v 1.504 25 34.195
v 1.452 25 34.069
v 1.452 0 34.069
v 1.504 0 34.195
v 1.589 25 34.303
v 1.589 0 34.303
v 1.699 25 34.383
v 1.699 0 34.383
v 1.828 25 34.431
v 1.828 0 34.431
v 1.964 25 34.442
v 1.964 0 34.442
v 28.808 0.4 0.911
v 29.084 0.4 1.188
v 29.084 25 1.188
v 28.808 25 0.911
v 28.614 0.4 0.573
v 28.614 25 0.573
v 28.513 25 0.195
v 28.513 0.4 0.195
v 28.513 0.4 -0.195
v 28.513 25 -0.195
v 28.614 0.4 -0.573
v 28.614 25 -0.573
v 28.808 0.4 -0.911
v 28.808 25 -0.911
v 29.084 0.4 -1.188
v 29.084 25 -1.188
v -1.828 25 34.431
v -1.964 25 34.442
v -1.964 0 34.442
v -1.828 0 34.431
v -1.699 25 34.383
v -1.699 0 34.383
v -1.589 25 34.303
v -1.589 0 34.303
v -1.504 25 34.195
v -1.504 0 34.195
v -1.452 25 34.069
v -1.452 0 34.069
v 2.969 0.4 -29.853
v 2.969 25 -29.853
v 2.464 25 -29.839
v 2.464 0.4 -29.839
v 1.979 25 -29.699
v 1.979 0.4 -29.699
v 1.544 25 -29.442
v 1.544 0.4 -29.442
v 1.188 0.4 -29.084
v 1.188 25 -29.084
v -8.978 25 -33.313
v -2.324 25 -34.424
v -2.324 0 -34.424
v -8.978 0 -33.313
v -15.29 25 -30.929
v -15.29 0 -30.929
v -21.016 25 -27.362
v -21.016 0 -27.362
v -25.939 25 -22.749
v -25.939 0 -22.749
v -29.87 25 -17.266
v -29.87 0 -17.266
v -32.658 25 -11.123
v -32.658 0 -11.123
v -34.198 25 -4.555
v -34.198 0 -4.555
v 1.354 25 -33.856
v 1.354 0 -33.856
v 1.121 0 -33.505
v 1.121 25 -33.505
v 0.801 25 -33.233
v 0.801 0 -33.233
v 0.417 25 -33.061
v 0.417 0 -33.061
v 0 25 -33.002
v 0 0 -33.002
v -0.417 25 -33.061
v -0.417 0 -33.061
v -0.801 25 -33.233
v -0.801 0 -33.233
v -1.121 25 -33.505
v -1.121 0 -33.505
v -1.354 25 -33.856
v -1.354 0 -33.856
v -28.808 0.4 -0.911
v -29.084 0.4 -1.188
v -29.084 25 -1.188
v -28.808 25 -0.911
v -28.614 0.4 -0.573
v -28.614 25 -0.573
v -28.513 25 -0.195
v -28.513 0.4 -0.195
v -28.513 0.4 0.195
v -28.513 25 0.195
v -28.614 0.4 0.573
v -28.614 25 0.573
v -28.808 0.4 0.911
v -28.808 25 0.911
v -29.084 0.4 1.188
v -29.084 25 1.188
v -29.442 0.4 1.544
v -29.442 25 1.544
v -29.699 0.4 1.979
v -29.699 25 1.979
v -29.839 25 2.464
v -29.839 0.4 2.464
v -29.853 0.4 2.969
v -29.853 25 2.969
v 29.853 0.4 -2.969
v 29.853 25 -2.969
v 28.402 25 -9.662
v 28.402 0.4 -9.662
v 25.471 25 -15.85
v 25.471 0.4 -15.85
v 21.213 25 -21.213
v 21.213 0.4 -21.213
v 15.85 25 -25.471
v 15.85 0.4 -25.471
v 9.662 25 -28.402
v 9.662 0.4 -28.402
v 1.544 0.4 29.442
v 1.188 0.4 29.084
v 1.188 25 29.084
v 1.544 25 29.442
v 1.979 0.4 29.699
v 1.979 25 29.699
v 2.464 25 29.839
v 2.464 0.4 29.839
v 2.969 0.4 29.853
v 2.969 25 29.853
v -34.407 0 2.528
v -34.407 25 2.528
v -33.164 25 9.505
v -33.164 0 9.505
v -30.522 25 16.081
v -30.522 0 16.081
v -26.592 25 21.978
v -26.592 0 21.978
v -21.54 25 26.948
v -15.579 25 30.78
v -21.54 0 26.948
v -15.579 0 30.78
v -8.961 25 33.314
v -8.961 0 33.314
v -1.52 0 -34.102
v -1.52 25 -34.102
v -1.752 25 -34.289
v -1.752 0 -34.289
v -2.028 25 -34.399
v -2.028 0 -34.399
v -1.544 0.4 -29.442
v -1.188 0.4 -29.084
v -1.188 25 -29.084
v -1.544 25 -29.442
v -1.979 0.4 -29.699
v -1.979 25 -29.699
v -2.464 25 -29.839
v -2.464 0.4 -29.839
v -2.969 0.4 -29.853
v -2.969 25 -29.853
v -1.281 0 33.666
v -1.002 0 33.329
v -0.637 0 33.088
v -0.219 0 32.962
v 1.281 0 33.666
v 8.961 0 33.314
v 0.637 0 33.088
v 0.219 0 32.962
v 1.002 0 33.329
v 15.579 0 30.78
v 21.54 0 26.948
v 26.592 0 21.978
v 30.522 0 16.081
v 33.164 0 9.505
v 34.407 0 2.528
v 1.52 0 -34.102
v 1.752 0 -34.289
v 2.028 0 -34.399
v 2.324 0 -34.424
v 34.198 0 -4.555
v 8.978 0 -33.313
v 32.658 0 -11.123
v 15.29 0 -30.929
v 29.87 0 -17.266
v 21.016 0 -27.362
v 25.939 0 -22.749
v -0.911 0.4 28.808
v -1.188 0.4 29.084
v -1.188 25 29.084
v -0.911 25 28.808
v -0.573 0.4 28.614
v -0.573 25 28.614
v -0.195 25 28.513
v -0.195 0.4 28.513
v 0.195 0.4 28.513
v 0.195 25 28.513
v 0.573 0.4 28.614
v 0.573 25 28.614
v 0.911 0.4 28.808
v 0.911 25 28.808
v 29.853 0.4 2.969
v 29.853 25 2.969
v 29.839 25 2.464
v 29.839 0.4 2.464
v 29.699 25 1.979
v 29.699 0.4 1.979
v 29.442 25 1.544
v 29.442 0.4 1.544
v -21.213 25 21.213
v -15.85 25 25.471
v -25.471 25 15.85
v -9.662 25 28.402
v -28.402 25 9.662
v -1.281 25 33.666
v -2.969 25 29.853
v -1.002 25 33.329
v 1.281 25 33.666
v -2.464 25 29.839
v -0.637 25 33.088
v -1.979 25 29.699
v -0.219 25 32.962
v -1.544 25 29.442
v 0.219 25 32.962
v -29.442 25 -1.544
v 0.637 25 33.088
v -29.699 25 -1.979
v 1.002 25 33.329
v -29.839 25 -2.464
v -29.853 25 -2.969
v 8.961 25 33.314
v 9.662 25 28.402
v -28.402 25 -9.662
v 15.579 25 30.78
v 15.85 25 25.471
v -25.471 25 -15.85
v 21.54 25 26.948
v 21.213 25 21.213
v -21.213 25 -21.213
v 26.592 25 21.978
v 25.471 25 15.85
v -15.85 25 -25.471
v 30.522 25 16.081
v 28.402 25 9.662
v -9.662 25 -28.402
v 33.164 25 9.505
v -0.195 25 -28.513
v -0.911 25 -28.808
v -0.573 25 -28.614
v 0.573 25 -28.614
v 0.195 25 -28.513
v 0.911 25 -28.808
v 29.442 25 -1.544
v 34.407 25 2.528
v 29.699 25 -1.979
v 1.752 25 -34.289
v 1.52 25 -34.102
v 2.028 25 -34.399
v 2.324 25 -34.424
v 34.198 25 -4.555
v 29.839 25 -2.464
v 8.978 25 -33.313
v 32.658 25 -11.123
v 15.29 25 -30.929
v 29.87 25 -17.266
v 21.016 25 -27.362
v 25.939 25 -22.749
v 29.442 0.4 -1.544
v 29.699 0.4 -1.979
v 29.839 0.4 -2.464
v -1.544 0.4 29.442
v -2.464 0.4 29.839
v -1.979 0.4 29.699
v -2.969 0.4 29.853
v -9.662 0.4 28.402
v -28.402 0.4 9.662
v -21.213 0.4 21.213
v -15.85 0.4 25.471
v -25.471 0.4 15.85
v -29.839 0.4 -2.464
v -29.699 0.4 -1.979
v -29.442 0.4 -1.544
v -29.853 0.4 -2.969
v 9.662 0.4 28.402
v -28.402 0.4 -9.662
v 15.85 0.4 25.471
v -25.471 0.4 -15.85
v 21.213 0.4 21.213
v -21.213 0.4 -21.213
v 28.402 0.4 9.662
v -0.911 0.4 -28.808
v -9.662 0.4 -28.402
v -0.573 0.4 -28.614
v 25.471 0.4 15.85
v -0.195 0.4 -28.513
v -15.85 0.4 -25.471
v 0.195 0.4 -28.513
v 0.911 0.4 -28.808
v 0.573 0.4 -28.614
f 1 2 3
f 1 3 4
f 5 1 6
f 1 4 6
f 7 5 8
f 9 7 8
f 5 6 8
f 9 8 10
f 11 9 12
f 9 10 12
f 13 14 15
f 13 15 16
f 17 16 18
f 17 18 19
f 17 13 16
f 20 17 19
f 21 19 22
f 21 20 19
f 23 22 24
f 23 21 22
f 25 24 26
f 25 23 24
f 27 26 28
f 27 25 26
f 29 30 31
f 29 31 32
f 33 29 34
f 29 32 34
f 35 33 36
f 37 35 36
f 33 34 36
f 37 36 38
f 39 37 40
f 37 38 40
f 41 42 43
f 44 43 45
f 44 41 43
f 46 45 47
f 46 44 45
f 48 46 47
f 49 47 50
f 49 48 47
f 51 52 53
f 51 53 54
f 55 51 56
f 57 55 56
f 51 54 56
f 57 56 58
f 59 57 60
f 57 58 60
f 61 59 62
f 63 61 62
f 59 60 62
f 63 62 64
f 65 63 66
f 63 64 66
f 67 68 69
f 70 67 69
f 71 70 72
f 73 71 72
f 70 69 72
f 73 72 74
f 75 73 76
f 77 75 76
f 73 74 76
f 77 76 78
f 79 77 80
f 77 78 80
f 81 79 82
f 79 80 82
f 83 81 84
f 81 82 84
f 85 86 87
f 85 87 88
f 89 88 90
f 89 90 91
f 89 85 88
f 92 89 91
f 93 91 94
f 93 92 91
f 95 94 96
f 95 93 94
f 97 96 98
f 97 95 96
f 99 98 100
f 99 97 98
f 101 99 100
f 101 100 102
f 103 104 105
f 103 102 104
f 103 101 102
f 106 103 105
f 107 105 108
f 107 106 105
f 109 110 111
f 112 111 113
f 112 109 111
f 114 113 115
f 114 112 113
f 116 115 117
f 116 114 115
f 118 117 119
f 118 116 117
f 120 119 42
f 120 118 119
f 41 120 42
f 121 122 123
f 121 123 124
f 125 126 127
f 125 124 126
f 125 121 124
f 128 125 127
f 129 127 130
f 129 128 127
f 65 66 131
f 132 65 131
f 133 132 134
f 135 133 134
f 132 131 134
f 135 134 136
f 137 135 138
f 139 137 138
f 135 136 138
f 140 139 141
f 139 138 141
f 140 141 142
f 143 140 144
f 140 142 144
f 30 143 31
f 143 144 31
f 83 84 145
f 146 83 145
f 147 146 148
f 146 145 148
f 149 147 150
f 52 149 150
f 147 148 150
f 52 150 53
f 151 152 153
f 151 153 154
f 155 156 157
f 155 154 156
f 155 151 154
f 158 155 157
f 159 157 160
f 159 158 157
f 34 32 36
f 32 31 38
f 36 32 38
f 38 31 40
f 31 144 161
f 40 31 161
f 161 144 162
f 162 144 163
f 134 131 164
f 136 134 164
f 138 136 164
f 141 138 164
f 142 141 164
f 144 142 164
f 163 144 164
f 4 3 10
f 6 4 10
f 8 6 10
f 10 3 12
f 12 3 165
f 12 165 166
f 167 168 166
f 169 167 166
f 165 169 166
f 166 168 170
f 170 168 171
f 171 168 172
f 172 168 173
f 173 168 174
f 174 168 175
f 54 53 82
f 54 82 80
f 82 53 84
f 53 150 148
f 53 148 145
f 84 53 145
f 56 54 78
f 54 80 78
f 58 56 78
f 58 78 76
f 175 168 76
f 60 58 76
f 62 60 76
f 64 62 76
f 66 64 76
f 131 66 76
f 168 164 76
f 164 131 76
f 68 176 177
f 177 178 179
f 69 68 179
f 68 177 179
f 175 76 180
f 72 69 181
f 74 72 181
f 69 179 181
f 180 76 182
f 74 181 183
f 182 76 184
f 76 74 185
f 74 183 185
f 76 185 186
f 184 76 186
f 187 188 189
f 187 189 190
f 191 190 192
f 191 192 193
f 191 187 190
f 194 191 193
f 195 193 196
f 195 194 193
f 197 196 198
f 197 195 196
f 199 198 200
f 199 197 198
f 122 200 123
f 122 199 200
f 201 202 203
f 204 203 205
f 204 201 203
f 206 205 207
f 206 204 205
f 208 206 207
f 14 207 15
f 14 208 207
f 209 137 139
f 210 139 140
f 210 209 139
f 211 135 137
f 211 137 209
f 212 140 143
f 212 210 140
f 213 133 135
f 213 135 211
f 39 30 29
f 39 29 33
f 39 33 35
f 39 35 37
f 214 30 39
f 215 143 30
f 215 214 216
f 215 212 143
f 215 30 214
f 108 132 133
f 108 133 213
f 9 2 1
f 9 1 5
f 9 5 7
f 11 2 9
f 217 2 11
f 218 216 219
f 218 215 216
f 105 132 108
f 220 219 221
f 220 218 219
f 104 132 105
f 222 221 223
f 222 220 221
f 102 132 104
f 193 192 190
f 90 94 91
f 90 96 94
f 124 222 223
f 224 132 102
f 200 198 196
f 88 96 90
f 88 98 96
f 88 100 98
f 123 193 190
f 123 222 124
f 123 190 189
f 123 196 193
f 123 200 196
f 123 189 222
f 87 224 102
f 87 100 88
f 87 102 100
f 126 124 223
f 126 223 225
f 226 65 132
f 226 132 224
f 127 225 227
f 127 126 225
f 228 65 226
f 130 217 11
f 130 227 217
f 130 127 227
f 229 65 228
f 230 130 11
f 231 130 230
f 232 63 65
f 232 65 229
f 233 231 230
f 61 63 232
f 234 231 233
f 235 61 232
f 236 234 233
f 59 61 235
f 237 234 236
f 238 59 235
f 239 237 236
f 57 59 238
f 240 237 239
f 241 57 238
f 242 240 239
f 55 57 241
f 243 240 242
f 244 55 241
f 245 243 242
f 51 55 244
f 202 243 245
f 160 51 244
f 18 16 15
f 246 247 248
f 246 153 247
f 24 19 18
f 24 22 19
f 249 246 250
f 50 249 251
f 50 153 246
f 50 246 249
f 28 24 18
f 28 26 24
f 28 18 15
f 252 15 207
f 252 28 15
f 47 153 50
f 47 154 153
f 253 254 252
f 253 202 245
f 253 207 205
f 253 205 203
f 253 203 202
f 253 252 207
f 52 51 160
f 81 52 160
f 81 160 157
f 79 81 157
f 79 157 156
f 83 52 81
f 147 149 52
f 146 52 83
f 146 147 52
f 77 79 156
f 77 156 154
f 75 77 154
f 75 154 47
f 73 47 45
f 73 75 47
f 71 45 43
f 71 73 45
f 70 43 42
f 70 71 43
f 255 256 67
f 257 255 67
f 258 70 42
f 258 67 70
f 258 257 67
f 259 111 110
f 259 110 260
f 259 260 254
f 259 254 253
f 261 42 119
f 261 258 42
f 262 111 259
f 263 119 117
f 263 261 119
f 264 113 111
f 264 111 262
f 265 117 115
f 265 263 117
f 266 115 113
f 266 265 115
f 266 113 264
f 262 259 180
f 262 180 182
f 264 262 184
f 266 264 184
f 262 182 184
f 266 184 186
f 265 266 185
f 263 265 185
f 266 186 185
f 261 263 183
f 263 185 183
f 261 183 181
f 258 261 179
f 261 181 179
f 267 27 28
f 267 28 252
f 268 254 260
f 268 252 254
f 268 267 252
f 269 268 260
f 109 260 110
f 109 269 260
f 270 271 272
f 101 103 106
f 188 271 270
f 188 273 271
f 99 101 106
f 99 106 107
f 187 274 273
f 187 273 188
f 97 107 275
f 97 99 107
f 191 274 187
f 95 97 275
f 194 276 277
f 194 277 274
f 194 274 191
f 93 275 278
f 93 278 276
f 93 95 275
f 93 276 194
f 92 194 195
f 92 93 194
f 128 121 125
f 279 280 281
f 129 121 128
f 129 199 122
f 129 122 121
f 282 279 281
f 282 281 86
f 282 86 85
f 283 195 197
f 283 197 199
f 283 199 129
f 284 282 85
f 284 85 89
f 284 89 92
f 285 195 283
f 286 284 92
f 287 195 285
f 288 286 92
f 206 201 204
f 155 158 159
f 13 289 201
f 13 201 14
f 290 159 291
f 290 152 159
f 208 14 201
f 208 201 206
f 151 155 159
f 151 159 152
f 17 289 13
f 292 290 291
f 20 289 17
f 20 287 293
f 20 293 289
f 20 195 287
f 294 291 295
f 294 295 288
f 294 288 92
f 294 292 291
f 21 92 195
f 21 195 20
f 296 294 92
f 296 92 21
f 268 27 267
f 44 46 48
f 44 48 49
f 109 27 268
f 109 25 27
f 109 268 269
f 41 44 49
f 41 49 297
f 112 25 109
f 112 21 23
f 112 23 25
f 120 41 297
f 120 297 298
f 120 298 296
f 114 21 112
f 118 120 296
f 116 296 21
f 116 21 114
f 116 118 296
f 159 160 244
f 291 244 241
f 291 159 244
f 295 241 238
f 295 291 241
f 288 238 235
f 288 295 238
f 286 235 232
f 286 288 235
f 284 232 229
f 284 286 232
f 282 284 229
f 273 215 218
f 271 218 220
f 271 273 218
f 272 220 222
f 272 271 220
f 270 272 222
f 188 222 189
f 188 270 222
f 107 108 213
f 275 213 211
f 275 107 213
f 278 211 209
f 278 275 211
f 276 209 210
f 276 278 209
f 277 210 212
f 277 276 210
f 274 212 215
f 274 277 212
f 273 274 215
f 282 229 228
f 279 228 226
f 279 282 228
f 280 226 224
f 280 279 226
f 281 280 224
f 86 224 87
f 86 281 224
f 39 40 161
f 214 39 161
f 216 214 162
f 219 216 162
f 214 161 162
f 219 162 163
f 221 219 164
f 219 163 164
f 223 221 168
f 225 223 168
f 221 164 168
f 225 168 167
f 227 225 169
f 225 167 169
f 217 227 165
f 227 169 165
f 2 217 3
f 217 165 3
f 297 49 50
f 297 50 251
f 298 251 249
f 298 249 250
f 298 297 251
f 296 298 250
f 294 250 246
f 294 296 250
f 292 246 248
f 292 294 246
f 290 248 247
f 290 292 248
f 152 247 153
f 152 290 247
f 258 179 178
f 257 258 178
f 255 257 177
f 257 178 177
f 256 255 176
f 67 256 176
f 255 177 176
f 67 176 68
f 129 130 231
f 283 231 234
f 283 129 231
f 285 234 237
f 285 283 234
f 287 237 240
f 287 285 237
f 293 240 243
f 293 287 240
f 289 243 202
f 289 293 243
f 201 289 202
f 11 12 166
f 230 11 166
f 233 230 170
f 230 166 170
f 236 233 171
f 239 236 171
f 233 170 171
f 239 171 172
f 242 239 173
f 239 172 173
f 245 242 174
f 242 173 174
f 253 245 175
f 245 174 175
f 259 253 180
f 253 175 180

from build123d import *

# Parameters (mm, degrees)
BOSS_EXTRUDE1_DEPTH = 25
CUT_EXTRUDE2_DEPTH  = 26
BOSS_EXTRUDE2_DEPTH = 0.4


with BuildPart() as part:
    # Sketch1 → Boss-Extrude1 (new body)
    with BuildSketch(Plane(origin=(0, 0, 0), x_dir=(1, 0, 0), z_dir=(0, 1, 0))):
        with BuildLine():
            ThreePointArc((1.451818925, -34.068556857), (1.641248992, -34.346908706), (1.964225605, -34.442038138))
            ThreePointArc((1.964225605, -34.442038138), (26.591847487, -21.978073076), (34.198225299, 4.555174015))
            ThreePointArc((34.198225299, 4.555174015), (23.590291339, 25.176355888), (2.324135821, 34.423627607))
            ThreePointArc((2.324135821, 34.423627607), (1.751838249, 34.289058819), (1.354061739, 33.856153382))
            ThreePointArc((1.354061739, 33.856153382), (0, 33.001534515), (-1.354061739, 33.856153382))
            ThreePointArc((-1.354061739, 33.856153382), (-1.751838249, 34.289058819), (-2.324135821, 34.423627607))
            ThreePointArc((-2.324135821, 34.423627607), (-23.590291339, 25.176355888), (-34.198225299, 4.555174015))
            ThreePointArc((-34.198225299, 4.555174015), (-26.591847487, -21.978073076), (-1.964225605, -34.442038138))
            ThreePointArc((-1.964225605, -34.442038138), (-1.641248992, -34.346908706), (-1.451818925, -34.068556857))
            ThreePointArc((-1.451818925, -34.068556857), (0, -32.945679925), (1.451818925, -34.068556857))
        make_face()
        with BuildLine():
            Line((-2.417, 3.787737139), (0, 3.787737139))
            Line((0, 3.787737139), (2.417, 3.787737139))
            ThreePointArc((2.417, 3.787737139), (0, -4.489512172), (-2.417, 3.787737139))
        make_face(mode=Mode.SUBTRACT)
    extrude(amount=BOSS_EXTRUDE1_DEPTH)

    # Sketch2 → Cut-Extrude2 (cut, through all)
    with BuildSketch(Plane(origin=(0, 0, 0), x_dir=(1, 0, 0), z_dir=(0, 1, 0))):
        with BuildLine():
            ThreePointArc((-29.852678571, -2.96944138), (-21.213203436, -21.213203436), (-2.96944138, -29.852678571))
            ThreePointArc((-2.96944138, -29.852678571), (-1.979132422, -29.698851682), (-1.187776552, -29.083928571))
            ThreePointArc((-1.187776552, -29.083928571), (0, -28.5), (1.187776552, -29.083928571))
            ThreePointArc((1.187776552, -29.083928571), (1.979132422, -29.698851682), (2.96944138, -29.852678571))
            ThreePointArc((2.96944138, -29.852678571), (21.213203436, -21.213203436), (29.852678571, -2.96944138))
            ThreePointArc((29.852678571, -2.96944138), (29.698851682, -1.979132422), (29.083928571, -1.187776552))
            ThreePointArc((29.083928571, -1.187776552), (28.5, 0), (29.083928571, 1.187776552))
            ThreePointArc((29.083928571, 1.187776552), (29.698851682, 1.979132422), (29.852678571, 2.96944138))
            ThreePointArc((29.852678571, 2.96944138), (21.213203436, 21.213203436), (2.96944138, 29.852678571))
            ThreePointArc((2.96944138, 29.852678571), (1.979132422, 29.698851682), (1.187776552, 29.083928571))
            ThreePointArc((1.187776552, 29.083928571), (0, 28.5), (-1.187776552, 29.083928571))
            ThreePointArc((-1.187776552, 29.083928571), (-1.979132422, 29.698851682), (-2.96944138, 29.852678571))
            ThreePointArc((-2.96944138, 29.852678571), (-21.213203436, 21.213203436), (-29.852678571, 2.96944138))
            ThreePointArc((-29.852678571, 2.96944138), (-29.698851682, 1.979132422), (-29.083928571, 1.187776552))
            ThreePointArc((-29.083928571, 1.187776552), (-28.5, 0), (-29.083928571, -1.187776552))
            ThreePointArc((-29.083928571, -1.187776552), (-29.698851682, -1.979132422), (-29.852678571, -2.96944138))
        make_face()
    extrude(amount=CUT_EXTRUDE2_DEPTH, mode=Mode.SUBTRACT)

    # Sketch2<2> → Boss-Extrude2 (add)
    with BuildSketch(Plane(origin=(0, 0, 0), x_dir=(1, 0, 0), z_dir=(0, 1, 0))):
        with BuildLine():
            ThreePointArc((-29.852678571, -2.96944138), (-21.213203436, -21.213203436), (-2.96944138, -29.852678571))
            ThreePointArc((-2.96944138, -29.852678571), (-1.979132422, -29.698851682), (-1.187776552, -29.083928571))
            ThreePointArc((-1.187776552, -29.083928571), (0, -28.5), (1.187776552, -29.083928571))
            ThreePointArc((1.187776552, -29.083928571), (1.979132422, -29.698851682), (2.96944138, -29.852678571))
            ThreePointArc((2.96944138, -29.852678571), (21.213203436, -21.213203436), (29.852678571, -2.96944138))
            ThreePointArc((29.852678571, -2.96944138), (29.698851682, -1.979132422), (29.083928571, -1.187776552))
            ThreePointArc((29.083928571, -1.187776552), (28.5, 0), (29.083928571, 1.187776552))
            ThreePointArc((29.083928571, 1.187776552), (29.698851682, 1.979132422), (29.852678571, 2.96944138))
            ThreePointArc((29.852678571, 2.96944138), (21.213203436, 21.213203436), (2.96944138, 29.852678571))
            ThreePointArc((2.96944138, 29.852678571), (1.979132422, 29.698851682), (1.187776552, 29.083928571))
            ThreePointArc((1.187776552, 29.083928571), (0, 28.5), (-1.187776552, 29.083928571))
            ThreePointArc((-1.187776552, 29.083928571), (-1.979132422, 29.698851682), (-2.96944138, 29.852678571))
            ThreePointArc((-2.96944138, 29.852678571), (-21.213203436, 21.213203436), (-29.852678571, 2.96944138))
            ThreePointArc((-29.852678571, 2.96944138), (-29.698851682, 1.979132422), (-29.083928571, 1.187776552))
            ThreePointArc((-29.083928571, 1.187776552), (-28.5, 0), (-29.083928571, -1.187776552))
            ThreePointArc((-29.083928571, -1.187776552), (-29.698851682, -1.979132422), (-29.852678571, -2.96944138))
        make_face()
    extrude(amount=BOSS_EXTRUDE2_DEPTH)


solid = part.part
